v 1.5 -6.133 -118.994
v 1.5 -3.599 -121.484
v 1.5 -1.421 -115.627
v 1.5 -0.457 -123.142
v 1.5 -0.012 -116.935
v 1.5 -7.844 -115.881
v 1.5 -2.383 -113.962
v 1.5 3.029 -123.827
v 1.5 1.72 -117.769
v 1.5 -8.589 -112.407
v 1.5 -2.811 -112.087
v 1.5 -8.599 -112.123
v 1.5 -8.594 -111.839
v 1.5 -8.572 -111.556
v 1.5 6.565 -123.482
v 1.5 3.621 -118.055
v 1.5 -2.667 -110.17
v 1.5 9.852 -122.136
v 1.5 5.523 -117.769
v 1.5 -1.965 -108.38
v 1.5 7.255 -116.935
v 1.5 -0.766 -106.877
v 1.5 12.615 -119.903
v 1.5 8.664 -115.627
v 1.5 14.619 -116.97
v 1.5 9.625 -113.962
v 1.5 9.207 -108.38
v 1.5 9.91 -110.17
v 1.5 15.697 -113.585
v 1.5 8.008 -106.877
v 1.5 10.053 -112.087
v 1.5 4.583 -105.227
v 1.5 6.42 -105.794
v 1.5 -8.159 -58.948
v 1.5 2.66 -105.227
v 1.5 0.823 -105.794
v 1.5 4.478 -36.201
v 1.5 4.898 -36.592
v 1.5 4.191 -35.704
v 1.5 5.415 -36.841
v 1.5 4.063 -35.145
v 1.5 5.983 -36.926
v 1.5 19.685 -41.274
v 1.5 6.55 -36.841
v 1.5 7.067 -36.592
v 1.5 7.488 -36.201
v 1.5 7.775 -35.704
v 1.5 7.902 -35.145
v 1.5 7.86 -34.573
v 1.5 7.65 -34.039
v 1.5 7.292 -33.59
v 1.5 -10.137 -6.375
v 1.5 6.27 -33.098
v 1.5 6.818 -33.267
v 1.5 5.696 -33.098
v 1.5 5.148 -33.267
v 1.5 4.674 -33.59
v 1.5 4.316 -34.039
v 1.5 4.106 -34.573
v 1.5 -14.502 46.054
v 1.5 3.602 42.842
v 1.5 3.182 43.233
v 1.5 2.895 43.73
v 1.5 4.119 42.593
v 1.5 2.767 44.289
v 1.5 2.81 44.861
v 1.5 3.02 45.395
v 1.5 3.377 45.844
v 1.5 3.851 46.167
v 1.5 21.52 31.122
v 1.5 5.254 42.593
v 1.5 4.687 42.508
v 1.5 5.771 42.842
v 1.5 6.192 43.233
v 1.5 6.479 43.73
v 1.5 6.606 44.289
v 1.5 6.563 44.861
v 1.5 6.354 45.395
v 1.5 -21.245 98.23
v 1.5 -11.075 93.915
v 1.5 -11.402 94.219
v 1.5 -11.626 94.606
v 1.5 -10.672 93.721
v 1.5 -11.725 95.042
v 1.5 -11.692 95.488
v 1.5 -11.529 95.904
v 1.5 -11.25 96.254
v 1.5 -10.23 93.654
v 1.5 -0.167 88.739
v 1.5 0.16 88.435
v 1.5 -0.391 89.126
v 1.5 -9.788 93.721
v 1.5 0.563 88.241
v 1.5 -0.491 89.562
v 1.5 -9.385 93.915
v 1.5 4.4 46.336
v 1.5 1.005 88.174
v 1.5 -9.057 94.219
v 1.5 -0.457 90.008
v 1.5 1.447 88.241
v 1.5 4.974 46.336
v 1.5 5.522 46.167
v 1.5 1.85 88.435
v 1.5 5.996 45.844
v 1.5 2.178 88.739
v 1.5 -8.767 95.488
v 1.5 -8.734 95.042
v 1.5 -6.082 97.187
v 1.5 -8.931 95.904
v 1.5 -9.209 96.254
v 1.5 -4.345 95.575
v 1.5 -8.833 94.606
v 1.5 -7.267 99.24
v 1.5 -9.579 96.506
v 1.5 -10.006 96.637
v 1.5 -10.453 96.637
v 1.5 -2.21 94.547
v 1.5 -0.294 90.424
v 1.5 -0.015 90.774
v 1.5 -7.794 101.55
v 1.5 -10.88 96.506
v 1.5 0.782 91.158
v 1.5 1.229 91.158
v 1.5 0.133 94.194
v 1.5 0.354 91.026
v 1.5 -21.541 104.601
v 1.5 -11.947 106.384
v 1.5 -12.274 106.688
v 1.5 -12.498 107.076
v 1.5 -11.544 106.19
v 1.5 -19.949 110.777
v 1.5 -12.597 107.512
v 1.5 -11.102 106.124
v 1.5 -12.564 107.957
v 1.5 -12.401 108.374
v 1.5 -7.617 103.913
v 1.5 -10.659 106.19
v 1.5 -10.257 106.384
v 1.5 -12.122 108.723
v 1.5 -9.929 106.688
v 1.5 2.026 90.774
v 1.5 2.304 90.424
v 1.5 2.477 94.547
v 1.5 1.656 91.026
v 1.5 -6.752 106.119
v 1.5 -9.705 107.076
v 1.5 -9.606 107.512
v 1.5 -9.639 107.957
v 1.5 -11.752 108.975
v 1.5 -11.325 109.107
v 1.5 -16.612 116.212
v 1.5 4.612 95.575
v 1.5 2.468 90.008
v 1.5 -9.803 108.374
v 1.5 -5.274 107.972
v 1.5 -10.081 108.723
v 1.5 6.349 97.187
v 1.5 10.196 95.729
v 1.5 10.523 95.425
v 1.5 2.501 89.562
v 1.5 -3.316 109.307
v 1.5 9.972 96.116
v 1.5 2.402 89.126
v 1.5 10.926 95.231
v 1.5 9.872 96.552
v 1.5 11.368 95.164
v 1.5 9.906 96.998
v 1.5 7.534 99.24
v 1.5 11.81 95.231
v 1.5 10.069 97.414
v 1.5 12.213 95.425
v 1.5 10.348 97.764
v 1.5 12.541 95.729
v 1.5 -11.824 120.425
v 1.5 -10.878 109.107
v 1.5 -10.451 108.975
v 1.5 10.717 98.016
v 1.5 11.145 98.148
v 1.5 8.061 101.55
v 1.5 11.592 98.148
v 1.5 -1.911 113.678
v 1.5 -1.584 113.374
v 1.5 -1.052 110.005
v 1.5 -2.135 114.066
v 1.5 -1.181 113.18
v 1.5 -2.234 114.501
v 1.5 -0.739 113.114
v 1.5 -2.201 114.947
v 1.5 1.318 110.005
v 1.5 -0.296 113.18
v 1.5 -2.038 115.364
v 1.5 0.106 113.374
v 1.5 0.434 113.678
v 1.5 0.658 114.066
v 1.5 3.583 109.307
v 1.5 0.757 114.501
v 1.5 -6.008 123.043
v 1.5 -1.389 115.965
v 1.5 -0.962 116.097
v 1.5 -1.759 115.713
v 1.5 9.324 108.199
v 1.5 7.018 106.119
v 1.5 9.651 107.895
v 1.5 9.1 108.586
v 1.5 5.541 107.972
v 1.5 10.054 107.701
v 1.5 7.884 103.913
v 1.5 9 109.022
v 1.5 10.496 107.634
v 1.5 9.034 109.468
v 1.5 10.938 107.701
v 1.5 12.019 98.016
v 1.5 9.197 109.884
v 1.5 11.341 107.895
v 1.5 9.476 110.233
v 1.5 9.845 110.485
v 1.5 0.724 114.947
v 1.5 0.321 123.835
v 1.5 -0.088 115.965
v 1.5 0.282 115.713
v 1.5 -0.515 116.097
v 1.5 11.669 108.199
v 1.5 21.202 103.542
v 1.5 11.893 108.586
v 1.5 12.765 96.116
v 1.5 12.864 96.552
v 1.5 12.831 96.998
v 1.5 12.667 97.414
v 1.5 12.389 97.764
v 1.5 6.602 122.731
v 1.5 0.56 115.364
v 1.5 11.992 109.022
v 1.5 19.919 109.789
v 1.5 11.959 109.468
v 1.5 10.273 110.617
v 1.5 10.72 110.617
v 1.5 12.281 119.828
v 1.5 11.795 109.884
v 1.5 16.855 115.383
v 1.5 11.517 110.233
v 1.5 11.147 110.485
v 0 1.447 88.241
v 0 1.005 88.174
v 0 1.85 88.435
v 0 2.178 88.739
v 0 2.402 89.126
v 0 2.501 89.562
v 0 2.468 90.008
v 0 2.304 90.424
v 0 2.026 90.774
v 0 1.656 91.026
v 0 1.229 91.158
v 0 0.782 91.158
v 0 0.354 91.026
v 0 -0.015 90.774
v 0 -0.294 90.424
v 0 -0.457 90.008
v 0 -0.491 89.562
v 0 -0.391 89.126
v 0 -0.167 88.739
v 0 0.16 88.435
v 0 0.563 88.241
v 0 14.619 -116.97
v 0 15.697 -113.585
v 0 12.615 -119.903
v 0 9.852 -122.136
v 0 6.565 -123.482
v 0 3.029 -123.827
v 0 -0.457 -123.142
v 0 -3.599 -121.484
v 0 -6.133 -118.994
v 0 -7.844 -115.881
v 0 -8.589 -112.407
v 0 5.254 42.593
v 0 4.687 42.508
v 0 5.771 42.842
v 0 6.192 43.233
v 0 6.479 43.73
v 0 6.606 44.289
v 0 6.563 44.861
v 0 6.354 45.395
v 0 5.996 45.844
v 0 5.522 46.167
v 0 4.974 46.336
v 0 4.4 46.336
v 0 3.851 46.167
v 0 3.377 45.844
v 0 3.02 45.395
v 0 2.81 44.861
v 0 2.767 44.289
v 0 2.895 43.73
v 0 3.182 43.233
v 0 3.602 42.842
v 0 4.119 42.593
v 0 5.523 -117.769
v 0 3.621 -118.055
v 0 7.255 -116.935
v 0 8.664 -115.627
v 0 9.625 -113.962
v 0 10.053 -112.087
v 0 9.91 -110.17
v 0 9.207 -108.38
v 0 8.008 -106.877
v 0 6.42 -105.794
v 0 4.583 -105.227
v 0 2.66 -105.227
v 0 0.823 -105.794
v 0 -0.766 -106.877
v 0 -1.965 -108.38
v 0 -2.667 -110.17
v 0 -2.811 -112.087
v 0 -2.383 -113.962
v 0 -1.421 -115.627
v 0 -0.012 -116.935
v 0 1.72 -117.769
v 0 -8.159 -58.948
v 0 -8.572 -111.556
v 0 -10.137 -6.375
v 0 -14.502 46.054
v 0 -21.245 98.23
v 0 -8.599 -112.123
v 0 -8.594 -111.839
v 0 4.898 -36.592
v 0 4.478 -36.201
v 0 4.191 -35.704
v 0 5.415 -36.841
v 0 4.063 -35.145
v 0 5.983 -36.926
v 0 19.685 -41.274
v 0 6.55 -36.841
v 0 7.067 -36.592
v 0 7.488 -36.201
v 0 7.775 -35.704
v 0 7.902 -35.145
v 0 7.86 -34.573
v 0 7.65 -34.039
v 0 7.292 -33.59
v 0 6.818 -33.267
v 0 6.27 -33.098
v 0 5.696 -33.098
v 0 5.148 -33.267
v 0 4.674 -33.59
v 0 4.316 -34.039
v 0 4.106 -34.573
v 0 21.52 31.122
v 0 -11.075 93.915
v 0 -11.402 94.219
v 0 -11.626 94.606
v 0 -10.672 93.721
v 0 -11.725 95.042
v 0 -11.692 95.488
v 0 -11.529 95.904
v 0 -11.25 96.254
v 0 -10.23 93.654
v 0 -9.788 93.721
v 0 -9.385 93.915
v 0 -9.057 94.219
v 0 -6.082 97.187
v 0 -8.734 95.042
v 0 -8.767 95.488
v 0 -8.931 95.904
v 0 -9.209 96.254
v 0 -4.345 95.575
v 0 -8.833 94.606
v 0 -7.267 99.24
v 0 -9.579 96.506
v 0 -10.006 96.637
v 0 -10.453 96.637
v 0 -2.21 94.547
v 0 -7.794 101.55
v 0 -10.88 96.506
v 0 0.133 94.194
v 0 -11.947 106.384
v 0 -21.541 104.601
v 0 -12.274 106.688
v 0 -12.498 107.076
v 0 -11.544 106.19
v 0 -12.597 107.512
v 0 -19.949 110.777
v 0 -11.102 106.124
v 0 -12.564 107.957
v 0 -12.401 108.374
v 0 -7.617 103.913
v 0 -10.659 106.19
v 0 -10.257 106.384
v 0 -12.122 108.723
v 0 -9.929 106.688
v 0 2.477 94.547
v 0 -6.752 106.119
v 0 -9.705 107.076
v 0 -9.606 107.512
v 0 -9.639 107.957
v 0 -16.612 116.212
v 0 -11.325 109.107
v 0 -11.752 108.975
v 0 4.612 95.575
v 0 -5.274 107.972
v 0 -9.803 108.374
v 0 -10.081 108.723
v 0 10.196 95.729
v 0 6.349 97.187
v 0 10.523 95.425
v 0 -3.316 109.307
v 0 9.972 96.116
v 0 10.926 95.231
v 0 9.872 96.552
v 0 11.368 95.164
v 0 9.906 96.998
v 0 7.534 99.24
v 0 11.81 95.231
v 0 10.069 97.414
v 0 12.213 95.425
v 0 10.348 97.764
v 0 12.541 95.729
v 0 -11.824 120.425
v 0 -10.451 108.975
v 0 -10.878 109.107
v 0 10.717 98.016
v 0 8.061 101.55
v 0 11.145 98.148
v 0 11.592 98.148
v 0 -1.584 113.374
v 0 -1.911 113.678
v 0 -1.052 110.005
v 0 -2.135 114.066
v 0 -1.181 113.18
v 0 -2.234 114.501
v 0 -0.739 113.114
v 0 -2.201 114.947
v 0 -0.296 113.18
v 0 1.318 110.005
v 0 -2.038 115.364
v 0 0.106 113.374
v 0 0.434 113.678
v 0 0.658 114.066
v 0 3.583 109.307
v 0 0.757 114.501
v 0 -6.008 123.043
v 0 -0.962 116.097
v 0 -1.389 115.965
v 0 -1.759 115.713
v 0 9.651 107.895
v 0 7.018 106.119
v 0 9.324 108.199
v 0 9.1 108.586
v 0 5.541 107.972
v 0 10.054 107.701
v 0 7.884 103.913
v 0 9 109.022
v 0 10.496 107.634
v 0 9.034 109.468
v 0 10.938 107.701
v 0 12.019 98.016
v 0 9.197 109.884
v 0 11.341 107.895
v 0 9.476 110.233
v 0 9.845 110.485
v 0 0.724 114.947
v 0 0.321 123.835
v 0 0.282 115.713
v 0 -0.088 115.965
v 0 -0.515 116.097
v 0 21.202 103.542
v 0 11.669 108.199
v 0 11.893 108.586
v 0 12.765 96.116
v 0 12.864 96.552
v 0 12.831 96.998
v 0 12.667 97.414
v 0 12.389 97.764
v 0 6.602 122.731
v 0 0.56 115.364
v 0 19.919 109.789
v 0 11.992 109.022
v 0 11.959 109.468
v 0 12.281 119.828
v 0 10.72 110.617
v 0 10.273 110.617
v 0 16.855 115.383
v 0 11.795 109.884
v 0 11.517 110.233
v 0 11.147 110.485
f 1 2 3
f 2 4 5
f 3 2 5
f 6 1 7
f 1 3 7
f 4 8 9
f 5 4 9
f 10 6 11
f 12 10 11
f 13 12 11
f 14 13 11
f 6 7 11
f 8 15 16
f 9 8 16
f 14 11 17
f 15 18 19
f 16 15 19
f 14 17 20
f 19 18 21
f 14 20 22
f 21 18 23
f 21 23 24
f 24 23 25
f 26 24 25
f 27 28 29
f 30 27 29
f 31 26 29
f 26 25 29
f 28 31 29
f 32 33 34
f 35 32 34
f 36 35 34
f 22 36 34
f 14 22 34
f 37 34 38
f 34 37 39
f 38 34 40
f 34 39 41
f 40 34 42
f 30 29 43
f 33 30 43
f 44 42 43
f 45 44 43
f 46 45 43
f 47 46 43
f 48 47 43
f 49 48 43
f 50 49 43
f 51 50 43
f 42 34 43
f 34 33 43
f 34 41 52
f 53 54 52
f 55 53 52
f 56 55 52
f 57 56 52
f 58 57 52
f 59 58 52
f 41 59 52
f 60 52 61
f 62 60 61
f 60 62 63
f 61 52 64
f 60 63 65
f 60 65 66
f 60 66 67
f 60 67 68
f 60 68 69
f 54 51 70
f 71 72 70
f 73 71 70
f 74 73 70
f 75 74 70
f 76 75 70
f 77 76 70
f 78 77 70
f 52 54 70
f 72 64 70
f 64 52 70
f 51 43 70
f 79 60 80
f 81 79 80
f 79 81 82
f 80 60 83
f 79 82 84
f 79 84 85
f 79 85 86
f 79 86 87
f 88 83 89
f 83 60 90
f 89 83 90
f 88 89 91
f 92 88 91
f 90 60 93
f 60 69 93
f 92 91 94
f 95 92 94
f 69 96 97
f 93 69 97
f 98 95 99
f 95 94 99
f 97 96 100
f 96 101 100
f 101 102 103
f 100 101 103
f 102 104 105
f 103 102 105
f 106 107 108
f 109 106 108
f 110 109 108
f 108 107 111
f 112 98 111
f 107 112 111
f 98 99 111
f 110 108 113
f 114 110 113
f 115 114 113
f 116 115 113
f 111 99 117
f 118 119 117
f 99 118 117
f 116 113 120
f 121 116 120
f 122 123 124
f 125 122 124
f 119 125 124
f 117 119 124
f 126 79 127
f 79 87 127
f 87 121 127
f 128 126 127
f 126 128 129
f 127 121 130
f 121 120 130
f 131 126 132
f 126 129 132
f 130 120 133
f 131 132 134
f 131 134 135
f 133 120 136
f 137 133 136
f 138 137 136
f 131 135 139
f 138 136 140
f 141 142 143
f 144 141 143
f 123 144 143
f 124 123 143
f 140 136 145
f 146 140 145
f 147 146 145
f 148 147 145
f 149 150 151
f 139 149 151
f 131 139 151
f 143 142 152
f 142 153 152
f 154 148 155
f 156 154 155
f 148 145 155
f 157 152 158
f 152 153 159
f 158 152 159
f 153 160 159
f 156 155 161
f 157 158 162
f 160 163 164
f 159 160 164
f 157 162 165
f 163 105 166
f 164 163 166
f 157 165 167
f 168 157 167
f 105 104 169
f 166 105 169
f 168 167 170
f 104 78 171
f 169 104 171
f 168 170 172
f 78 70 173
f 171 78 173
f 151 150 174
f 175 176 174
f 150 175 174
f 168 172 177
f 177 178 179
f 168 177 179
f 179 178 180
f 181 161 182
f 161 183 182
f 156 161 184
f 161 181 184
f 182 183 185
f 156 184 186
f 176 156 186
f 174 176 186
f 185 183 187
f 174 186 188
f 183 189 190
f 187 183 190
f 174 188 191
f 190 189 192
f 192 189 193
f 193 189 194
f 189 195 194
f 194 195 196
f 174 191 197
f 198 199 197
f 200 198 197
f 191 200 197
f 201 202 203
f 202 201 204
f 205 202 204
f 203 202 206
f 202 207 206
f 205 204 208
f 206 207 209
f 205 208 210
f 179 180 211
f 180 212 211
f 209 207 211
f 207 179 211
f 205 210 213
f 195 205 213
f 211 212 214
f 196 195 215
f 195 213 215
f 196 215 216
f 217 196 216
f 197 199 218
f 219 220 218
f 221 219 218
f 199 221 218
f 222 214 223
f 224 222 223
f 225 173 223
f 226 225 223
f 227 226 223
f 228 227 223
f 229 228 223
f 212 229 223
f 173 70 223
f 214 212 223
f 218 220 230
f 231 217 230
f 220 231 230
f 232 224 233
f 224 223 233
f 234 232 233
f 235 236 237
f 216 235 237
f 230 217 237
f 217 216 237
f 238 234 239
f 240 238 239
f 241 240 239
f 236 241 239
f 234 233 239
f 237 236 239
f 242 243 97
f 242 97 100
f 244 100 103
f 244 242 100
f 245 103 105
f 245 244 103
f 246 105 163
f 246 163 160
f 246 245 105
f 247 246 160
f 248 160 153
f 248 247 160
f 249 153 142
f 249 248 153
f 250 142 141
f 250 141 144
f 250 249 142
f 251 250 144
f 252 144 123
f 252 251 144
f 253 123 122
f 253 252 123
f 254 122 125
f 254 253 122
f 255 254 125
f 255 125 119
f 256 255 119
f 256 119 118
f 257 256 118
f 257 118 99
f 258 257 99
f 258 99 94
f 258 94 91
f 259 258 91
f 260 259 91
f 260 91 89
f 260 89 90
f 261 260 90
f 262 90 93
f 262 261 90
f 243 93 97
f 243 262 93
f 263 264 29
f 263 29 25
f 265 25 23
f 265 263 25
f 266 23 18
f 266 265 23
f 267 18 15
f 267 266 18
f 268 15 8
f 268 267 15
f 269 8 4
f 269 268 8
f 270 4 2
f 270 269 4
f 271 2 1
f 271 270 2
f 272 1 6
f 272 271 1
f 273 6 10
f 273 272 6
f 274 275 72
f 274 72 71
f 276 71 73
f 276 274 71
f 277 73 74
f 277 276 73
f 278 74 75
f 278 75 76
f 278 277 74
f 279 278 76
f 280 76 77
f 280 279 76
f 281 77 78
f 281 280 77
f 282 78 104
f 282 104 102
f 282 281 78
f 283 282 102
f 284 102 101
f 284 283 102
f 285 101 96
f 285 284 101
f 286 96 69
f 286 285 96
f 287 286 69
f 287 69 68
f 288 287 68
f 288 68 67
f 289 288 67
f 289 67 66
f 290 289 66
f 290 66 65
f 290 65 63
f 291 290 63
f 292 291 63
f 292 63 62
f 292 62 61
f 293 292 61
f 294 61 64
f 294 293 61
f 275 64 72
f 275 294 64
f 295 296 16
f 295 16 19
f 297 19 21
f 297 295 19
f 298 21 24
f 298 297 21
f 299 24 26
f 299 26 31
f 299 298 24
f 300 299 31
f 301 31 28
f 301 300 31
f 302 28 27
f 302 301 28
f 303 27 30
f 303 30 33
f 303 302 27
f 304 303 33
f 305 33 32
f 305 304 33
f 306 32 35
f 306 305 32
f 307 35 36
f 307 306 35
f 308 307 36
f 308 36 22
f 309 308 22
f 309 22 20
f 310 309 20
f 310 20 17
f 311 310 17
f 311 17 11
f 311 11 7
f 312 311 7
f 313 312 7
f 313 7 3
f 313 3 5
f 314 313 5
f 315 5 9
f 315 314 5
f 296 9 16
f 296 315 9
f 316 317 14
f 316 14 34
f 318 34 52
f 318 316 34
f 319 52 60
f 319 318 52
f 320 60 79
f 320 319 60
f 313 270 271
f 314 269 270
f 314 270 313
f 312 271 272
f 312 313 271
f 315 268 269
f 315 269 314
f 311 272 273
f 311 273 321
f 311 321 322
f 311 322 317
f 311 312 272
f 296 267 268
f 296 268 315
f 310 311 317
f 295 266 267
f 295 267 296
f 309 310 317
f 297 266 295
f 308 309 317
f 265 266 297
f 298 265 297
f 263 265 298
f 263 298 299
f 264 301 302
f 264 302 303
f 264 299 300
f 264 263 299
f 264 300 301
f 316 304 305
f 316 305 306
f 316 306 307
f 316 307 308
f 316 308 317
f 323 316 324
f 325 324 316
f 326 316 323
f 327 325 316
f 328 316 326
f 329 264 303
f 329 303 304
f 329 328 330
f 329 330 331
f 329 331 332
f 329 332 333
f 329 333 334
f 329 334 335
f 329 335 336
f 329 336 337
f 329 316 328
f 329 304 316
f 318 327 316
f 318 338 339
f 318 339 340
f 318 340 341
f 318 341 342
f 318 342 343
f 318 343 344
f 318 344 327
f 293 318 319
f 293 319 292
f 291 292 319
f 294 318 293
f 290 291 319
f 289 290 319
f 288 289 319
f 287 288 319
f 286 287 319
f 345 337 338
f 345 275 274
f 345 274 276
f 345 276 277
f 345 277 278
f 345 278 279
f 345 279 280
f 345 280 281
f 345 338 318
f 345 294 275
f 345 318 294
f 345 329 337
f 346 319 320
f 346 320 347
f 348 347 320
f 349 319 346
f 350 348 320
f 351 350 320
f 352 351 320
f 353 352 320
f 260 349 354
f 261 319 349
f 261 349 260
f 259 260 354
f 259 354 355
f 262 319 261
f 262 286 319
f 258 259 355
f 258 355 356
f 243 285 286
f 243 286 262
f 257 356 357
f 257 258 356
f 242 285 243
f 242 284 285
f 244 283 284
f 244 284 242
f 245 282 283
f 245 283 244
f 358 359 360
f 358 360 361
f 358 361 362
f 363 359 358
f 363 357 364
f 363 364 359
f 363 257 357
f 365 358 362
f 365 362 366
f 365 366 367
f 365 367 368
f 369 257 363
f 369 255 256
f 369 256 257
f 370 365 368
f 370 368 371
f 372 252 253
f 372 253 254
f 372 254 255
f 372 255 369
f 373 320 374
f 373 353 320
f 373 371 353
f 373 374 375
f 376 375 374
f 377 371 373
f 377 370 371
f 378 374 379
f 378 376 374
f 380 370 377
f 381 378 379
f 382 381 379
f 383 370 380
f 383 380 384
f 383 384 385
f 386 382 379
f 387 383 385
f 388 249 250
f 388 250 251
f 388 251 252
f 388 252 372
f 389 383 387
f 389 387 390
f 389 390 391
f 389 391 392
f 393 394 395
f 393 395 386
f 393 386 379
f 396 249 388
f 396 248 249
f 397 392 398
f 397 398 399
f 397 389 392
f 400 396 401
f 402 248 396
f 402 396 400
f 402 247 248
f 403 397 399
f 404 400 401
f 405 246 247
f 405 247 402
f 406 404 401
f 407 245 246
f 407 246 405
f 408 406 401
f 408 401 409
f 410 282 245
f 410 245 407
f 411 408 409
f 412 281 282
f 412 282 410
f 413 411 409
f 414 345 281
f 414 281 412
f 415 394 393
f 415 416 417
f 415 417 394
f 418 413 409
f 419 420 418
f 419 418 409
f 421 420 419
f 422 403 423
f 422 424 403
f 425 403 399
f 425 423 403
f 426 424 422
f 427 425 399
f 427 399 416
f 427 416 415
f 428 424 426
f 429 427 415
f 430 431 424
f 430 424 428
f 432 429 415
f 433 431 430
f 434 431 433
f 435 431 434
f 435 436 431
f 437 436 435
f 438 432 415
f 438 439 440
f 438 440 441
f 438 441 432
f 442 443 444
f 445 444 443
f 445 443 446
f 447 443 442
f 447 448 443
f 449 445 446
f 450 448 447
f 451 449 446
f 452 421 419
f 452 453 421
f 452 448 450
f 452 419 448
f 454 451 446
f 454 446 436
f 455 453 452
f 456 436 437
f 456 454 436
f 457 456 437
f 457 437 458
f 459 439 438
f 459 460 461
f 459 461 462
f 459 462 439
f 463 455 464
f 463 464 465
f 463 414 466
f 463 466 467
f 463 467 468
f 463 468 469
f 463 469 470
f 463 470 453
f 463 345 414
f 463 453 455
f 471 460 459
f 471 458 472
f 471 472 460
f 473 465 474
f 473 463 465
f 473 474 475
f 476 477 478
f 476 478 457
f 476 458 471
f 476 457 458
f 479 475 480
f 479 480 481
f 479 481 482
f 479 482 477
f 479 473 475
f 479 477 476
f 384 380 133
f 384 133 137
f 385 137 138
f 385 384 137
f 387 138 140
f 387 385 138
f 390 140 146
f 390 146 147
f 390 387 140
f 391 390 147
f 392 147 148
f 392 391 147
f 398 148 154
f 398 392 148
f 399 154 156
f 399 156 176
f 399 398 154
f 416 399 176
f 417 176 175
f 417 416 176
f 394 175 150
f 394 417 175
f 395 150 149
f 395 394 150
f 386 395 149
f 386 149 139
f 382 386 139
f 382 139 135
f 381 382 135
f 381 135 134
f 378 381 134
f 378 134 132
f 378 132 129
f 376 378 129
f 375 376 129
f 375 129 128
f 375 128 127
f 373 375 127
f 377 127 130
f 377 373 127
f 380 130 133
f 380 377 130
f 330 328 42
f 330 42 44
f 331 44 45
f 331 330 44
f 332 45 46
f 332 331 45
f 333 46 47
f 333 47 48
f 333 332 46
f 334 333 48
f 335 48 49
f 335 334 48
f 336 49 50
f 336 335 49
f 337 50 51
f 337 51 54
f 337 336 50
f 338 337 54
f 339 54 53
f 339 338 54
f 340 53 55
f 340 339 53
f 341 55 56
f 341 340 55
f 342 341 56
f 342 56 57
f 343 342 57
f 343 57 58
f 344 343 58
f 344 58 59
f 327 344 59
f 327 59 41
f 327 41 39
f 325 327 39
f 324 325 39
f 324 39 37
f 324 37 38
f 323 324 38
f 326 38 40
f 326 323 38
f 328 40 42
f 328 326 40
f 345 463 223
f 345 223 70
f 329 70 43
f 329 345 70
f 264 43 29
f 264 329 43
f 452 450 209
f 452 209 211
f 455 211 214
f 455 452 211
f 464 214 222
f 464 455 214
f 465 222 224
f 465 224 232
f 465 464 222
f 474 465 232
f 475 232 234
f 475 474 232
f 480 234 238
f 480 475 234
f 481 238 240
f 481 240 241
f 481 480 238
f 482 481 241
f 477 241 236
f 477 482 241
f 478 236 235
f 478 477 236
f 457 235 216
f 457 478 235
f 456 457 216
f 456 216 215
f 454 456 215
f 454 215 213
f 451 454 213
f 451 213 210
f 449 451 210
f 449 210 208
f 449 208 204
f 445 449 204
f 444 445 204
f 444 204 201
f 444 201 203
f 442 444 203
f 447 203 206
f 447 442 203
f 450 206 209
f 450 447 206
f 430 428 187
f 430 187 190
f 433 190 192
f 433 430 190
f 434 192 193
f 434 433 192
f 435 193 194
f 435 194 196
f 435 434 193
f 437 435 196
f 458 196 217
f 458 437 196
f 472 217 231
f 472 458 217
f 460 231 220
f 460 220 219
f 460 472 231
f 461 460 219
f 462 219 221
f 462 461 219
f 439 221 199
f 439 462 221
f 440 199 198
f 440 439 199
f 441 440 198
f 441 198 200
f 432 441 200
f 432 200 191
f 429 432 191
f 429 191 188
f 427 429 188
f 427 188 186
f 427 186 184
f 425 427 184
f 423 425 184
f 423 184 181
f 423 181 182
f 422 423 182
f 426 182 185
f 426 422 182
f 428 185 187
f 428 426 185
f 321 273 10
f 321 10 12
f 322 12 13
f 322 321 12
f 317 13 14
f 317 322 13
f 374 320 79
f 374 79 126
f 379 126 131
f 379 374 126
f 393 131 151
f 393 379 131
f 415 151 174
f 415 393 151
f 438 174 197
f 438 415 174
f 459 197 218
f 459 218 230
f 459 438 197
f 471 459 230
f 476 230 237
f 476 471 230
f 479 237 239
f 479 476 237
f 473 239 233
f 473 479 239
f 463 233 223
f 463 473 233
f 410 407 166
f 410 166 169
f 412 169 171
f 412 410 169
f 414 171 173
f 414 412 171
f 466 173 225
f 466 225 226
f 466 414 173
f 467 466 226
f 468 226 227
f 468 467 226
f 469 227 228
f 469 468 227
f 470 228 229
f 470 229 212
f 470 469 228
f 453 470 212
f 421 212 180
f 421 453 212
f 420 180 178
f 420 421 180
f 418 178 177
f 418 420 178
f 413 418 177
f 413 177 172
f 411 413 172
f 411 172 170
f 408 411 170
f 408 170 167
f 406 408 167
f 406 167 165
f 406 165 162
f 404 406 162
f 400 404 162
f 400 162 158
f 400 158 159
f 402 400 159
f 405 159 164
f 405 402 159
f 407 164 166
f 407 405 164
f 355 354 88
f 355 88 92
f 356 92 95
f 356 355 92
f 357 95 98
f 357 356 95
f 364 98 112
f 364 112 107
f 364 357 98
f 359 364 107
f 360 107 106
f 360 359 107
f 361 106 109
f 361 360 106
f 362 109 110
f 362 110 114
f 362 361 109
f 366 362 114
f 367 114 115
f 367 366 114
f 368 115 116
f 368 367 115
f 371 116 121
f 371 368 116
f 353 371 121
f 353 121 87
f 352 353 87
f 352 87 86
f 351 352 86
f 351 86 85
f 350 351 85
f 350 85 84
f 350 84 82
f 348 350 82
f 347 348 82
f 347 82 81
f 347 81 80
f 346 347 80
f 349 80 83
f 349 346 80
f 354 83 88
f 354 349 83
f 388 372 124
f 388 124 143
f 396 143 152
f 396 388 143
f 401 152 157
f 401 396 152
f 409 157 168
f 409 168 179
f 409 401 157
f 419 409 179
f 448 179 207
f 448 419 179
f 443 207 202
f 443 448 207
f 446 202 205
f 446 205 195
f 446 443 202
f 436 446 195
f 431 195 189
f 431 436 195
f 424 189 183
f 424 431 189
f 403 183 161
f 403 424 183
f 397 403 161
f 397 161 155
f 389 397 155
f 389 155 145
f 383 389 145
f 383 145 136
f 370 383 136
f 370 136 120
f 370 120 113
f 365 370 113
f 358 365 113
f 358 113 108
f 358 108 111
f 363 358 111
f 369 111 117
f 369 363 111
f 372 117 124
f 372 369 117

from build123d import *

# Parameters (mm, degrees)
SKETCH_1_R      = 1.5
SKETCH_1_R_2    = 6.45
SKETCH_1_R_3    = 7.95
SKETCH_1_R_4    = 1.925
EXTRUDE_1_DEPTH = 1.5


with BuildPart() as part:
    # 草圖1 → 填料-伸長1 (new body)
    with BuildSketch(Plane(origin=(0, 0, 0), x_dir=(0, 0, -1), z_dir=(1, 0, 0))):
        with BuildLine():
            ThreePointArc((111.555989952, -8.572011863), (6.374730125, -10.137132711), (-98.230068302, -21.244930328))
            ThreePointArc((-98.230068302, -21.244930328), (-123.67575498, -2.873316644), (-103.541794939, 21.20204032))
            ThreePointArc((-103.541794939, 21.20204032), (5.082777822, 20.871677912), (113.584507189, 15.696576829))
            ThreePointArc((113.584507189, 15.696576829), (123.827345593, 3.028727453), (112.406990492, -8.588743688))
            ThreePointArc((112.406990492, -8.588743688), (111.981133536, -8.59851924), (111.555989952, -8.572011863))
        make_face()
        with Locations((-109.133892688, 10.496301174)):
            Circle(SKETCH_1_R, mode=Mode.SUBTRACT)
        with Locations((-114.613532023, -0.738624405)):
            Circle(SKETCH_1_R, mode=Mode.SUBTRACT)
        with Locations((-107.62362073, -11.101594062)):
            Circle(SKETCH_1_R, mode=Mode.SUBTRACT)
        with Locations((-95.154070101, -10.22963814)):
            Circle(SKETCH_1_R, mode=Mode.SUBTRACT)
        with Locations((-89.674430767, 1.005287439)):
            Circle(SKETCH_1_R, mode=Mode.SUBTRACT)
        with Locations((-96.66434206, 11.368257096)):
            Circle(SKETCH_1_R, mode=Mode.SUBTRACT)
        with Locations((111.605339346, 3.621333032)):
            Circle(SKETCH_1_R_2, mode=Mode.SUBTRACT)
        with Locations((-102.143981395, 0.133331517)):
            Circle(SKETCH_1_R_3, mode=Mode.SUBTRACT)
        with Locations((35.001055541, 5.982881827)):
            Circle(SKETCH_1_R_4, mode=Mode.SUBTRACT)
        with Locations((-44.432813653, 4.686665047)):
            Circle(SKETCH_1_R_4, mode=Mode.SUBTRACT)
    extrude(amount=EXTRUDE_1_DEPTH)


solid = part.part
